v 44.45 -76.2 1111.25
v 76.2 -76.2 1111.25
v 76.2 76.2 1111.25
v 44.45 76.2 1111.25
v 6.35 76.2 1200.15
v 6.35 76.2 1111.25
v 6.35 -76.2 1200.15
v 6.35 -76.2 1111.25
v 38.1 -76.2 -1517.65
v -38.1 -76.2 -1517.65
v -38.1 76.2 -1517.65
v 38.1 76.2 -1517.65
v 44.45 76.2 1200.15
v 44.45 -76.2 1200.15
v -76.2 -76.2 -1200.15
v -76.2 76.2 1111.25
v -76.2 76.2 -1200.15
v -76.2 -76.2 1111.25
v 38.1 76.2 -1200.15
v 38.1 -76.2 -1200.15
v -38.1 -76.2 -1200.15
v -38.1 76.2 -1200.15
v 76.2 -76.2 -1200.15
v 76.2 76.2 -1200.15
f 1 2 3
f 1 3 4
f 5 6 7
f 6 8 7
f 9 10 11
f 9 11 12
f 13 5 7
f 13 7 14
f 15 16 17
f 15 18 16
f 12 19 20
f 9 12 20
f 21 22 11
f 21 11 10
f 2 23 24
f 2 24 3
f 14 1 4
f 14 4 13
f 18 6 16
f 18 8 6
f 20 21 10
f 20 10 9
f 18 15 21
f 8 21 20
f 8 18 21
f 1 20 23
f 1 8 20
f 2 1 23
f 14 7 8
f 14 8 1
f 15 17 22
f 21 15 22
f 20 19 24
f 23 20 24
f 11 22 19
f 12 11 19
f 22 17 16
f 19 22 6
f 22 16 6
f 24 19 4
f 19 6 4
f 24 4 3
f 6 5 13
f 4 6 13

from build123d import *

# Parameters (mm, degrees)
F0_W     = 38.1
F0_H     = 88.9
F1_DEPTH = 76.2
F2_W     = 76.2
F2_H     = 152.4
F3_DEPTH = 317.5


# Not quite as in the source:
# - a feature names something its author has since deleted; it is built from what else it names


with BuildPart() as f1:
    # F0 (on Front) → F1 (new body, symmetric)
    with BuildSketch(Plane.XZ):
        Polygon((6.35, 1111.25), (-76.2, 1111.25), (-76.2, -1200.15), (76.2, -1200.15), (76.2, 1111.25), (44.45, 1111.25), align=None)
        with Locations((25.4, 1155.7)):
            Rectangle(F0_W, F0_H)
    extrude(amount=F1_DEPTH, both=True)

    # F2 (on face) → F3 (join)
    with BuildSketch(Plane(origin=(0, 0, -1200.15), x_dir=(1, 0, 0), z_dir=(0, 0, -1))):
        Rectangle(F2_W, F2_H)
    extrude(amount=F3_DEPTH)


solid = f1.part
